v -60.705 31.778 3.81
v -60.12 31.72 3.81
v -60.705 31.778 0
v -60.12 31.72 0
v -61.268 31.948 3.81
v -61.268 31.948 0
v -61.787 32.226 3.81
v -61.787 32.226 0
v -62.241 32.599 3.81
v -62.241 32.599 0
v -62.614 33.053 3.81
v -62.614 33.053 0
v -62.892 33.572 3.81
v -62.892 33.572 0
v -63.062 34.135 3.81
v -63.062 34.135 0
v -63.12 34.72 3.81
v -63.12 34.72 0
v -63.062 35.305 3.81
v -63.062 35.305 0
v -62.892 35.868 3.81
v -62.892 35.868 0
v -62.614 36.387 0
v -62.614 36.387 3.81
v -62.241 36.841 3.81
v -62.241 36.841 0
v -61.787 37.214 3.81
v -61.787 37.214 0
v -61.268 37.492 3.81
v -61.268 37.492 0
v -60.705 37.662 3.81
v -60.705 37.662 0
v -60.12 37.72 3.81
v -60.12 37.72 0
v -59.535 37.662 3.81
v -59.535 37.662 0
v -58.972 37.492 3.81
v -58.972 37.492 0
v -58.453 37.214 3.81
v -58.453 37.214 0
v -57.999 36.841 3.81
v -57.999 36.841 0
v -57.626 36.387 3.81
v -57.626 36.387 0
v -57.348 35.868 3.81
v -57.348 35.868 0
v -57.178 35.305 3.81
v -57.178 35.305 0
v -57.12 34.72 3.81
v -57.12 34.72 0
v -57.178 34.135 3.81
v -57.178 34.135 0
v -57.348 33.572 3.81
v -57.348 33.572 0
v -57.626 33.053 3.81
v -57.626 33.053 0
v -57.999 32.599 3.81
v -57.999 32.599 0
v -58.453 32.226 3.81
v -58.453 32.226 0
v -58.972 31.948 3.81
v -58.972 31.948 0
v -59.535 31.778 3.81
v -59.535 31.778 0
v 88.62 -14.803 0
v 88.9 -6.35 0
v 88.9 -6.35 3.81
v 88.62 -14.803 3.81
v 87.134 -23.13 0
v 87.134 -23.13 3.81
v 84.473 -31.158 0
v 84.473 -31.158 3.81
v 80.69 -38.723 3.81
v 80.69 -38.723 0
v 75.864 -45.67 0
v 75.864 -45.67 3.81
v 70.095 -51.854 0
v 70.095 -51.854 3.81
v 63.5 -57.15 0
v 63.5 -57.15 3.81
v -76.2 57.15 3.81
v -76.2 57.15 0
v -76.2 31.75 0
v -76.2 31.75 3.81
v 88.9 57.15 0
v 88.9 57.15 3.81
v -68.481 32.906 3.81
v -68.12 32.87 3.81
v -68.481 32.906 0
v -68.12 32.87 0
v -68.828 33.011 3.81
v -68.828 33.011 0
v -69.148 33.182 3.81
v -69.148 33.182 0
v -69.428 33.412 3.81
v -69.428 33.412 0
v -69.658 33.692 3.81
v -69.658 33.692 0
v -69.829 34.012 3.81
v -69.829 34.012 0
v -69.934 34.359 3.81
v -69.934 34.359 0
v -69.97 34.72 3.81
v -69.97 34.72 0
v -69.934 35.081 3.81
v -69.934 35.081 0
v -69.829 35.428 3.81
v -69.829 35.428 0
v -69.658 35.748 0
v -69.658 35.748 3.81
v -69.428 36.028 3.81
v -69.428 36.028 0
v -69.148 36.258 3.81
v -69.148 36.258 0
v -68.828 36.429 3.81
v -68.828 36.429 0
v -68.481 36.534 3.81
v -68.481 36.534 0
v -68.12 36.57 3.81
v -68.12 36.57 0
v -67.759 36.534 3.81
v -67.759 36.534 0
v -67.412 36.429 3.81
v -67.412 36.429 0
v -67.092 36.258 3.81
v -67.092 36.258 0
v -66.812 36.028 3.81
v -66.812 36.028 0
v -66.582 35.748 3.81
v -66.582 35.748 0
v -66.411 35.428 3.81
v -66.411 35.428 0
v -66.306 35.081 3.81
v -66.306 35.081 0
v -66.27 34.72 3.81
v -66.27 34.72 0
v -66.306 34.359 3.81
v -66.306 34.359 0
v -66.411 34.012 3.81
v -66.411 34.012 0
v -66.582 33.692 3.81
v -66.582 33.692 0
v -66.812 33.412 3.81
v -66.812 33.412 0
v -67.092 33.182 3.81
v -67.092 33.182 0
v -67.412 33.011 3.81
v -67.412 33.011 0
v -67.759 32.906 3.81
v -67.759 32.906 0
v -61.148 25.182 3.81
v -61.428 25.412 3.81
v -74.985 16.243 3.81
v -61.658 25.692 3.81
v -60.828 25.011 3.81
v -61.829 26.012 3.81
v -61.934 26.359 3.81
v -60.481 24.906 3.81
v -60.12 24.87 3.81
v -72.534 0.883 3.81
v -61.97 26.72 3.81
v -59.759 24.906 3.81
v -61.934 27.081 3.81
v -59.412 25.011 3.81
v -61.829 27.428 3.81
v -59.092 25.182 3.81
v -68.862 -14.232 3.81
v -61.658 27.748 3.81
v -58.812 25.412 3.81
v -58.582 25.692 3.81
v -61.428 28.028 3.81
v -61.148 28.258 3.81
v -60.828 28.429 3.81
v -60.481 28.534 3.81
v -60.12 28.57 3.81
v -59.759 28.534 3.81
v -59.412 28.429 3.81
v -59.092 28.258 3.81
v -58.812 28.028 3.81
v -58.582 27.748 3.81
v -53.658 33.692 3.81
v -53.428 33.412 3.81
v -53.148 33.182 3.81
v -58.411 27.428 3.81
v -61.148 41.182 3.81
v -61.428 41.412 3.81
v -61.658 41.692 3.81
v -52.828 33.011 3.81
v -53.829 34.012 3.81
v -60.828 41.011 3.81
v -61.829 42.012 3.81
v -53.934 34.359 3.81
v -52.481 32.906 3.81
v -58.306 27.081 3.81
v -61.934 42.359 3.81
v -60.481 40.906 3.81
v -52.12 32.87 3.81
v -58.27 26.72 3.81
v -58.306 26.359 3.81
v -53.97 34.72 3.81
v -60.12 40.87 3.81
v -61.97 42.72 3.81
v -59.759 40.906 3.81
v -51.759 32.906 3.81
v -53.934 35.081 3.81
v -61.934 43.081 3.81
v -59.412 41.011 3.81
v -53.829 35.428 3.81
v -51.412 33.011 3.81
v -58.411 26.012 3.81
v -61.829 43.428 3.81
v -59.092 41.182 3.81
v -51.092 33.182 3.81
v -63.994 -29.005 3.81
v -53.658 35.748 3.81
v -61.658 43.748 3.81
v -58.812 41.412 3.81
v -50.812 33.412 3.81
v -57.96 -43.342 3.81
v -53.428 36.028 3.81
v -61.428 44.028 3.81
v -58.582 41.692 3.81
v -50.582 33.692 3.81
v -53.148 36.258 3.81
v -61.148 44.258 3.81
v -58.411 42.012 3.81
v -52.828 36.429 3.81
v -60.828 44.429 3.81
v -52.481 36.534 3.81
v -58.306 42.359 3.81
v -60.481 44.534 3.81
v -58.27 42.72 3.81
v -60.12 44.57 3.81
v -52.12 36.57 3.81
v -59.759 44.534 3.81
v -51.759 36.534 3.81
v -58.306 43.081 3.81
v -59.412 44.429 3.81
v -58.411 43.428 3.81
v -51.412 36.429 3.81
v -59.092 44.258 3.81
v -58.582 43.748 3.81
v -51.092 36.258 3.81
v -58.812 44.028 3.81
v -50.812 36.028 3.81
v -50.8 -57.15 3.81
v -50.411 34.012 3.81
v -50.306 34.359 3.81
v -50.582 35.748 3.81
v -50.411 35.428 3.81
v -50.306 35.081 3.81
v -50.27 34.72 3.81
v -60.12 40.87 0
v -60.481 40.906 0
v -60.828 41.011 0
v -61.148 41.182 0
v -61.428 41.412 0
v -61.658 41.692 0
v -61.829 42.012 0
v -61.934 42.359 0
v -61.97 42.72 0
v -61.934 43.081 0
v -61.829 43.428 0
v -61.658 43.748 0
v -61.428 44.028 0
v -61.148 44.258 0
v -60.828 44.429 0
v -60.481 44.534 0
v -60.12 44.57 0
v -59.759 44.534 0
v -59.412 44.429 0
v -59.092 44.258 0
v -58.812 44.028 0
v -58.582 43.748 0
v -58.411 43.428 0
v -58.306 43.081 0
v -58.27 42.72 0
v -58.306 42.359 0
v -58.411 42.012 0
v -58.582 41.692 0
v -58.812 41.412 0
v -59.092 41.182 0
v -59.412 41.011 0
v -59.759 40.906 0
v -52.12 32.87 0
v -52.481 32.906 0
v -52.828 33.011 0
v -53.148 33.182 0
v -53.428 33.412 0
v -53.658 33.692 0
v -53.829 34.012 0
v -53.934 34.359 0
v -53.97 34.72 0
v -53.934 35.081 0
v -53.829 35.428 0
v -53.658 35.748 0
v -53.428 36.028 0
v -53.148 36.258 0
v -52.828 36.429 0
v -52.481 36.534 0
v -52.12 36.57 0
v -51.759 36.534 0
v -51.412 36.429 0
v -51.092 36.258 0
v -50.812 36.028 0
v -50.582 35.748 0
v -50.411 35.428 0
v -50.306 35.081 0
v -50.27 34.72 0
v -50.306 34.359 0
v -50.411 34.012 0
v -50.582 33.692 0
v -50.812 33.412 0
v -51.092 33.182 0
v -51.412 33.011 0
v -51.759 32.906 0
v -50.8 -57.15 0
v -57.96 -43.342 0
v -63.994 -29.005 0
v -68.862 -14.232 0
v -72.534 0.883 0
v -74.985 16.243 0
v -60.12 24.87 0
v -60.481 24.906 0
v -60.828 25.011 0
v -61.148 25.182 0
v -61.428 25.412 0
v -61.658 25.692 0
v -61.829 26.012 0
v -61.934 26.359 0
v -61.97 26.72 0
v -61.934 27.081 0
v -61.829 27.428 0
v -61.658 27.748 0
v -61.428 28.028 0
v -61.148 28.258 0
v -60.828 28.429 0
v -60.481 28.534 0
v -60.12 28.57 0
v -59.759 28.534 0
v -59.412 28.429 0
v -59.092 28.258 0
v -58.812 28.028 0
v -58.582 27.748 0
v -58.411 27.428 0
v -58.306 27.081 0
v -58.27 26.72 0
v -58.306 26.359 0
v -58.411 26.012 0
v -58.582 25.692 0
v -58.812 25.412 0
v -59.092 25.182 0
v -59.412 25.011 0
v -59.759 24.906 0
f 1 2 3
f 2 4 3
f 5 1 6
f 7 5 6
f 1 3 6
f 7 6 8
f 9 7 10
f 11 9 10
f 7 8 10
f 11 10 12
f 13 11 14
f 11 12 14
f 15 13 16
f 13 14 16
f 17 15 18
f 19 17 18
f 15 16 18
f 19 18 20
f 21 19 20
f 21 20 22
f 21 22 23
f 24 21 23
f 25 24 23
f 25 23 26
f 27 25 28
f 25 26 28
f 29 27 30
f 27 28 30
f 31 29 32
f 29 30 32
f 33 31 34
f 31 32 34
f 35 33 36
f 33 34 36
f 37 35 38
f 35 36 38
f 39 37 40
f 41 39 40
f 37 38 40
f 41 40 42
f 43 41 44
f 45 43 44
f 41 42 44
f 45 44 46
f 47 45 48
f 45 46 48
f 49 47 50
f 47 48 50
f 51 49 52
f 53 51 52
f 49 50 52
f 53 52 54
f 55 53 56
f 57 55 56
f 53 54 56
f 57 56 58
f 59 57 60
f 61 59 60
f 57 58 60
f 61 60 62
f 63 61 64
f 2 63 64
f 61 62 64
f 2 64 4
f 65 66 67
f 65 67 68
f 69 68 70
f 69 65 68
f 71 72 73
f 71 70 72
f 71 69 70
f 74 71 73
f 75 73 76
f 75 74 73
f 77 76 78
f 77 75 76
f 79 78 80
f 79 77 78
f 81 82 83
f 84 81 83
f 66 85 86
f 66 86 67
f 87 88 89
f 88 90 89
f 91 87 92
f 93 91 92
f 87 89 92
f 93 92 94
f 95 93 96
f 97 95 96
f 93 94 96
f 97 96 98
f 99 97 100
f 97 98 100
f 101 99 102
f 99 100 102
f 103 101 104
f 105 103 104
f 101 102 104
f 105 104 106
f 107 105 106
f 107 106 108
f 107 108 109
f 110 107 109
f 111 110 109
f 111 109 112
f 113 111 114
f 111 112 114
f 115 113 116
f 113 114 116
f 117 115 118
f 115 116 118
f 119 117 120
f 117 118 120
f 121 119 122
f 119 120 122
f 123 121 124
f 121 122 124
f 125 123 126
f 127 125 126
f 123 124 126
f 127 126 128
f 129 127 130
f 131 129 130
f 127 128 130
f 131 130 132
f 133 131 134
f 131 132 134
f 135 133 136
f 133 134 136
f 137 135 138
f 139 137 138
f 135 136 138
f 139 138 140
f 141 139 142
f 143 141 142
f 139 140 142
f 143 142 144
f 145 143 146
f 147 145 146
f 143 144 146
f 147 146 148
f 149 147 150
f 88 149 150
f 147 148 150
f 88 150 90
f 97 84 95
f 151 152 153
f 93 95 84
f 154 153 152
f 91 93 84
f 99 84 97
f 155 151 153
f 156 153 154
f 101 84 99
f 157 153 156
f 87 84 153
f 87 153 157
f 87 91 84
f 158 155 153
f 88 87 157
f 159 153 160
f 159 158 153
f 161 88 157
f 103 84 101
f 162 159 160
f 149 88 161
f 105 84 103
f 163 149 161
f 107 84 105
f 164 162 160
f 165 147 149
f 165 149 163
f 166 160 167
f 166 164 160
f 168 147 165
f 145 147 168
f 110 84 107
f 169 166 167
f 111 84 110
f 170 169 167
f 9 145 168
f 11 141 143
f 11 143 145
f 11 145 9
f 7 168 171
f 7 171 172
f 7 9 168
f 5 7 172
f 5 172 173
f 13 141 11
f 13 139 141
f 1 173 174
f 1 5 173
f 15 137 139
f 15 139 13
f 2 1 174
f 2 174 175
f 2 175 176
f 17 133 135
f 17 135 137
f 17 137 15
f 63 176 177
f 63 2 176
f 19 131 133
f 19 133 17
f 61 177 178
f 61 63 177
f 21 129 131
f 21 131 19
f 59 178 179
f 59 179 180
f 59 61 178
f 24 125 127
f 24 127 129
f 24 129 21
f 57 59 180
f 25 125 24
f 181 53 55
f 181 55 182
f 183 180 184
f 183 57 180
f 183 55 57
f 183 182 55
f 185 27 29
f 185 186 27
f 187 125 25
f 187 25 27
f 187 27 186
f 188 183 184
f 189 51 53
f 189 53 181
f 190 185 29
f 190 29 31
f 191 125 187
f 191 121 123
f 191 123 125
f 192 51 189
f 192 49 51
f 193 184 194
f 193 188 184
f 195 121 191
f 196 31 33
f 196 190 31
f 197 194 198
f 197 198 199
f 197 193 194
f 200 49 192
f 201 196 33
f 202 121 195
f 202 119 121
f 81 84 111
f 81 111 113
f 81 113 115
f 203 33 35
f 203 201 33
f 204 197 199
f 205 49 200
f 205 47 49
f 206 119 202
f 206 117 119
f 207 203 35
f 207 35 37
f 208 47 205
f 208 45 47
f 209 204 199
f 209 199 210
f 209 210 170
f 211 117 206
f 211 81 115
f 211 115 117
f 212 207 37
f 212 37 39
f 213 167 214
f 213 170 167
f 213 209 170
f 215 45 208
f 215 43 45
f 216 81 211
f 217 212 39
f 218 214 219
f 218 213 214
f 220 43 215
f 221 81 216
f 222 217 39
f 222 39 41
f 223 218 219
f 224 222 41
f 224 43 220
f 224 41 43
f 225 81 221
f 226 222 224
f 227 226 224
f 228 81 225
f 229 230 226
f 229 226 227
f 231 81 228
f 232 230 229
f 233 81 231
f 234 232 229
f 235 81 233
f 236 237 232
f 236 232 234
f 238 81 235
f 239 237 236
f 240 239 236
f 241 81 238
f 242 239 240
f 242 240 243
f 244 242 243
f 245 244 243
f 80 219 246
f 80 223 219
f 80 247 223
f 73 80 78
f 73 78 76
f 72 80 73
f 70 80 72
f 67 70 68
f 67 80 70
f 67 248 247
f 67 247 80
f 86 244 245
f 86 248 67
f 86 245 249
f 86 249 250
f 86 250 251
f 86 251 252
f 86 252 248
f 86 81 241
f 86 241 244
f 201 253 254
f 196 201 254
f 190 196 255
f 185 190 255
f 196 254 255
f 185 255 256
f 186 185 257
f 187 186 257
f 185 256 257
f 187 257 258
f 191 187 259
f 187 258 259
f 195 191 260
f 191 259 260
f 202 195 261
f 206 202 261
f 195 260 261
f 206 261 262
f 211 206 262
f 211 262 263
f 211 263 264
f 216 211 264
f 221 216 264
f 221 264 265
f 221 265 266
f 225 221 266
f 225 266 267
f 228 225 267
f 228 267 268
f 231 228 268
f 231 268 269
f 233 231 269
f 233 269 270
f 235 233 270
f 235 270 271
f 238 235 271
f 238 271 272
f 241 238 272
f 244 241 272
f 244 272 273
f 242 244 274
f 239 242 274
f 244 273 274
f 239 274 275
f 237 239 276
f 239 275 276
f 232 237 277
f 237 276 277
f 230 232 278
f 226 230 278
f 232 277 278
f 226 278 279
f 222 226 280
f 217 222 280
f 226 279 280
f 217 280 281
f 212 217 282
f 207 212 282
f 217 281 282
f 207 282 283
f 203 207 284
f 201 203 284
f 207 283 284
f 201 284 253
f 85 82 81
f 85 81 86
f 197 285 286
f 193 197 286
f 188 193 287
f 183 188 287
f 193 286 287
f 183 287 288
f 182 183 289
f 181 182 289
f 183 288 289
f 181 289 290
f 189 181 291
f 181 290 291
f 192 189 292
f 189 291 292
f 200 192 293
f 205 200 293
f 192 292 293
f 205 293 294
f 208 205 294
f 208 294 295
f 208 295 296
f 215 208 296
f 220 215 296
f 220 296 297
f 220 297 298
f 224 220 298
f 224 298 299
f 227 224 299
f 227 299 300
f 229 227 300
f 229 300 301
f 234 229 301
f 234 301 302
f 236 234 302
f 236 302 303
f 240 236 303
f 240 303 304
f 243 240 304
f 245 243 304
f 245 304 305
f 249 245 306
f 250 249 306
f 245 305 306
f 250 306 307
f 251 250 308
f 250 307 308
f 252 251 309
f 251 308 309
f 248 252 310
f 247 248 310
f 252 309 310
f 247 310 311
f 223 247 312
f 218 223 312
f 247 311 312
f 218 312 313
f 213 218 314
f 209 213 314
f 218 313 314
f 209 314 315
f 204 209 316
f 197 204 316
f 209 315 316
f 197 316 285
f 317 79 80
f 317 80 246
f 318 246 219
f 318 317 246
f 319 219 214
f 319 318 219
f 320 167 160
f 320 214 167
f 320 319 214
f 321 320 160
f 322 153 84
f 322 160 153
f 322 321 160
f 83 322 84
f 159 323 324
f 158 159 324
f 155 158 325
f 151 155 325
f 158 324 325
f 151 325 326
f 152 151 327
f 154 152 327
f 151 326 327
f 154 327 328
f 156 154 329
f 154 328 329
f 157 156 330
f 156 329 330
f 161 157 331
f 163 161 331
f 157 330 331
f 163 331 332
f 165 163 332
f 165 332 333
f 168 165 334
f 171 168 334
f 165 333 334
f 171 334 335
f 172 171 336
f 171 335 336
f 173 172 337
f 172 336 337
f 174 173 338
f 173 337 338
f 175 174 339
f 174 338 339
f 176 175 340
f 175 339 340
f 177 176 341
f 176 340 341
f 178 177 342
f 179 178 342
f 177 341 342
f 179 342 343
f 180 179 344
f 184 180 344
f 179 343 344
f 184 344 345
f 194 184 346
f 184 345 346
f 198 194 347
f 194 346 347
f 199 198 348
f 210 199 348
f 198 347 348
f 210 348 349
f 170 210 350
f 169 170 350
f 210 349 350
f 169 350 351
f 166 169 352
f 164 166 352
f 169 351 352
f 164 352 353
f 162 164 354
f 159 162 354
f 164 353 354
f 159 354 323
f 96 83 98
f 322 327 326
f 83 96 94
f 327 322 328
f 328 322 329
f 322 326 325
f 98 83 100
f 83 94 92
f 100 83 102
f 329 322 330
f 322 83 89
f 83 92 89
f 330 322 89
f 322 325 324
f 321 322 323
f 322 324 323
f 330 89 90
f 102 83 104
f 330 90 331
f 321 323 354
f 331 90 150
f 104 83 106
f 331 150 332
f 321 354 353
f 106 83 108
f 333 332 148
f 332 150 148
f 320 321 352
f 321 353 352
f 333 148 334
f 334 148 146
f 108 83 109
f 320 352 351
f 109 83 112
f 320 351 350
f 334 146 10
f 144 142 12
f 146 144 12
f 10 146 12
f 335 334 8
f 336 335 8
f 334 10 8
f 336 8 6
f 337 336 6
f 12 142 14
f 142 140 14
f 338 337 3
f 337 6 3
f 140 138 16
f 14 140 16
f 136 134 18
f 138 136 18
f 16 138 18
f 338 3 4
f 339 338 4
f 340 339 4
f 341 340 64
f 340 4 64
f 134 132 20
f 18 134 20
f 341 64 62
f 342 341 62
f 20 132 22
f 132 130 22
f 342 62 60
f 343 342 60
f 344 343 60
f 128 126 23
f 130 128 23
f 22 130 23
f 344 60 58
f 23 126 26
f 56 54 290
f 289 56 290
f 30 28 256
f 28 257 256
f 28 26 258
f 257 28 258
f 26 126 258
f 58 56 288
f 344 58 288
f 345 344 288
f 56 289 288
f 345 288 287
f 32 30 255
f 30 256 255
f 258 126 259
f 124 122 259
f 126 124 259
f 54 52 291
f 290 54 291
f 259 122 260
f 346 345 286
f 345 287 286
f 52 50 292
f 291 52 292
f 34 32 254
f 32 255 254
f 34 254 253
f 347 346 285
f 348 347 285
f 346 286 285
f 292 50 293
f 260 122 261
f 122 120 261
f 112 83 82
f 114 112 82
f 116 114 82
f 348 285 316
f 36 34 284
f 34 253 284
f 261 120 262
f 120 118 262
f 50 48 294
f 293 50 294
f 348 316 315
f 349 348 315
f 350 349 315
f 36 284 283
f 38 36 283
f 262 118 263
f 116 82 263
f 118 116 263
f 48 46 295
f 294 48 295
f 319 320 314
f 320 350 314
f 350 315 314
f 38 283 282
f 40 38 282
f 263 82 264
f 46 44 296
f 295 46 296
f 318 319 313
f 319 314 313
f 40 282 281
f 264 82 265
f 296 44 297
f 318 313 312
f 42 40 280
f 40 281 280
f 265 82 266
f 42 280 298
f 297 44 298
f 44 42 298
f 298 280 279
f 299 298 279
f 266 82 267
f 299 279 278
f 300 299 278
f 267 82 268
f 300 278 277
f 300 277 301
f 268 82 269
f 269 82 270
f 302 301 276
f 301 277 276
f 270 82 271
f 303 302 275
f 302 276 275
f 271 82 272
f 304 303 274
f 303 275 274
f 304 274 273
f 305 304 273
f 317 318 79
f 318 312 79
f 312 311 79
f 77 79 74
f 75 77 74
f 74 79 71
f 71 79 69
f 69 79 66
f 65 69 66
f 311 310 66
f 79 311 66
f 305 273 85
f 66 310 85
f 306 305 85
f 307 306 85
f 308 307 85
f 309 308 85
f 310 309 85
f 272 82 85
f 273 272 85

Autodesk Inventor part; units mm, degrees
ref_plane "YZ Plane" through (0, 0, 0) normal (1, 0, 0) x (0, 1, 0)
ref_plane "XZ Plane" through (0, 0, 0) normal (0, 1, 0) x (-1, 0, 0)
ref_plane "XY Plane" through (0, 0, 0) normal (0, 0, 1) x (1, 0, 0)
sketch "Sketch1" plane through (0, 0, 0) normal (0, 0, 1) x (1, 0, 0)
  line L0 (-76.2, 57.15) -> (88.9, 57.15)
  line L1 (88.9, -57.15) -> (-76.2, 57.15) construction
  line L2 (-76.2, -57.15) -> (88.9, 57.15) construction
  line L3 (-76.2, 57.15) -> (-76.2, 31.75)
  arc A0 (-76.2, 31.75) -> (-50.8, -57.15) centre (118.0556, 39.173) ccw
  arc A1 (63.5, -57.15) -> (88.9, -6.35) centre (29.9616, -8.6308) ccw
  line L4 (88.9, 57.15) -> (88.9, -6.35)
  line L5 (63.5, -57.15) -> (-50.8, -57.15)
  point P0 (6.35, 0)
  dimension "d21" = 165.1
  dimension "d22" = 114.3
  dimension "d23" = 25.4
  dimension "d24" = 25.4
  dimension "d25" = 50.8
  dimension "d26" = 25.4
extrude "Extrusion1" add sketch "Sketch1" along normal blind 3.81
sketch "Sketch2" plane through (0, 0, 3.81) normal (0, 0, 1) x (1, 0, 0)
  circle A0 centre (-60.12, 42.72) radius 1.75 projected
  circle A1 centre (-52.12, 34.72) radius 1.75 projected
  circle A2 centre (-68.12, 34.72) radius 1.75 projected
  circle A3 centre (-60.12, 26.72) radius 1.75 projected
  circle A4 centre (-60.12, 34.72) radius 2.85 projected
  point P0 (0, 0)
hole "Hole1" at (-60.12, 42.72, 3.81) at (-68.12, 34.72, 3.81) at (-60.12, 26.72, 3.81) at (-52.12, 34.72, 3.81) direction (0, 0, -1) diameter 3.7 end through all
sketch "Sketch3" plane through (0, 0, 3.81) normal (0, 0, 1) x (1, 0, 0)
  circle A0 centre (-60.12, 34.72) radius 2.85 projected
  point P0 (0, 0)
hole "Hole2" at (-60.12, 34.72, 3.81) direction (0, 0, -1) diameter 6 end through all
properties part number "Bucket - door" material "PET Plastic"
